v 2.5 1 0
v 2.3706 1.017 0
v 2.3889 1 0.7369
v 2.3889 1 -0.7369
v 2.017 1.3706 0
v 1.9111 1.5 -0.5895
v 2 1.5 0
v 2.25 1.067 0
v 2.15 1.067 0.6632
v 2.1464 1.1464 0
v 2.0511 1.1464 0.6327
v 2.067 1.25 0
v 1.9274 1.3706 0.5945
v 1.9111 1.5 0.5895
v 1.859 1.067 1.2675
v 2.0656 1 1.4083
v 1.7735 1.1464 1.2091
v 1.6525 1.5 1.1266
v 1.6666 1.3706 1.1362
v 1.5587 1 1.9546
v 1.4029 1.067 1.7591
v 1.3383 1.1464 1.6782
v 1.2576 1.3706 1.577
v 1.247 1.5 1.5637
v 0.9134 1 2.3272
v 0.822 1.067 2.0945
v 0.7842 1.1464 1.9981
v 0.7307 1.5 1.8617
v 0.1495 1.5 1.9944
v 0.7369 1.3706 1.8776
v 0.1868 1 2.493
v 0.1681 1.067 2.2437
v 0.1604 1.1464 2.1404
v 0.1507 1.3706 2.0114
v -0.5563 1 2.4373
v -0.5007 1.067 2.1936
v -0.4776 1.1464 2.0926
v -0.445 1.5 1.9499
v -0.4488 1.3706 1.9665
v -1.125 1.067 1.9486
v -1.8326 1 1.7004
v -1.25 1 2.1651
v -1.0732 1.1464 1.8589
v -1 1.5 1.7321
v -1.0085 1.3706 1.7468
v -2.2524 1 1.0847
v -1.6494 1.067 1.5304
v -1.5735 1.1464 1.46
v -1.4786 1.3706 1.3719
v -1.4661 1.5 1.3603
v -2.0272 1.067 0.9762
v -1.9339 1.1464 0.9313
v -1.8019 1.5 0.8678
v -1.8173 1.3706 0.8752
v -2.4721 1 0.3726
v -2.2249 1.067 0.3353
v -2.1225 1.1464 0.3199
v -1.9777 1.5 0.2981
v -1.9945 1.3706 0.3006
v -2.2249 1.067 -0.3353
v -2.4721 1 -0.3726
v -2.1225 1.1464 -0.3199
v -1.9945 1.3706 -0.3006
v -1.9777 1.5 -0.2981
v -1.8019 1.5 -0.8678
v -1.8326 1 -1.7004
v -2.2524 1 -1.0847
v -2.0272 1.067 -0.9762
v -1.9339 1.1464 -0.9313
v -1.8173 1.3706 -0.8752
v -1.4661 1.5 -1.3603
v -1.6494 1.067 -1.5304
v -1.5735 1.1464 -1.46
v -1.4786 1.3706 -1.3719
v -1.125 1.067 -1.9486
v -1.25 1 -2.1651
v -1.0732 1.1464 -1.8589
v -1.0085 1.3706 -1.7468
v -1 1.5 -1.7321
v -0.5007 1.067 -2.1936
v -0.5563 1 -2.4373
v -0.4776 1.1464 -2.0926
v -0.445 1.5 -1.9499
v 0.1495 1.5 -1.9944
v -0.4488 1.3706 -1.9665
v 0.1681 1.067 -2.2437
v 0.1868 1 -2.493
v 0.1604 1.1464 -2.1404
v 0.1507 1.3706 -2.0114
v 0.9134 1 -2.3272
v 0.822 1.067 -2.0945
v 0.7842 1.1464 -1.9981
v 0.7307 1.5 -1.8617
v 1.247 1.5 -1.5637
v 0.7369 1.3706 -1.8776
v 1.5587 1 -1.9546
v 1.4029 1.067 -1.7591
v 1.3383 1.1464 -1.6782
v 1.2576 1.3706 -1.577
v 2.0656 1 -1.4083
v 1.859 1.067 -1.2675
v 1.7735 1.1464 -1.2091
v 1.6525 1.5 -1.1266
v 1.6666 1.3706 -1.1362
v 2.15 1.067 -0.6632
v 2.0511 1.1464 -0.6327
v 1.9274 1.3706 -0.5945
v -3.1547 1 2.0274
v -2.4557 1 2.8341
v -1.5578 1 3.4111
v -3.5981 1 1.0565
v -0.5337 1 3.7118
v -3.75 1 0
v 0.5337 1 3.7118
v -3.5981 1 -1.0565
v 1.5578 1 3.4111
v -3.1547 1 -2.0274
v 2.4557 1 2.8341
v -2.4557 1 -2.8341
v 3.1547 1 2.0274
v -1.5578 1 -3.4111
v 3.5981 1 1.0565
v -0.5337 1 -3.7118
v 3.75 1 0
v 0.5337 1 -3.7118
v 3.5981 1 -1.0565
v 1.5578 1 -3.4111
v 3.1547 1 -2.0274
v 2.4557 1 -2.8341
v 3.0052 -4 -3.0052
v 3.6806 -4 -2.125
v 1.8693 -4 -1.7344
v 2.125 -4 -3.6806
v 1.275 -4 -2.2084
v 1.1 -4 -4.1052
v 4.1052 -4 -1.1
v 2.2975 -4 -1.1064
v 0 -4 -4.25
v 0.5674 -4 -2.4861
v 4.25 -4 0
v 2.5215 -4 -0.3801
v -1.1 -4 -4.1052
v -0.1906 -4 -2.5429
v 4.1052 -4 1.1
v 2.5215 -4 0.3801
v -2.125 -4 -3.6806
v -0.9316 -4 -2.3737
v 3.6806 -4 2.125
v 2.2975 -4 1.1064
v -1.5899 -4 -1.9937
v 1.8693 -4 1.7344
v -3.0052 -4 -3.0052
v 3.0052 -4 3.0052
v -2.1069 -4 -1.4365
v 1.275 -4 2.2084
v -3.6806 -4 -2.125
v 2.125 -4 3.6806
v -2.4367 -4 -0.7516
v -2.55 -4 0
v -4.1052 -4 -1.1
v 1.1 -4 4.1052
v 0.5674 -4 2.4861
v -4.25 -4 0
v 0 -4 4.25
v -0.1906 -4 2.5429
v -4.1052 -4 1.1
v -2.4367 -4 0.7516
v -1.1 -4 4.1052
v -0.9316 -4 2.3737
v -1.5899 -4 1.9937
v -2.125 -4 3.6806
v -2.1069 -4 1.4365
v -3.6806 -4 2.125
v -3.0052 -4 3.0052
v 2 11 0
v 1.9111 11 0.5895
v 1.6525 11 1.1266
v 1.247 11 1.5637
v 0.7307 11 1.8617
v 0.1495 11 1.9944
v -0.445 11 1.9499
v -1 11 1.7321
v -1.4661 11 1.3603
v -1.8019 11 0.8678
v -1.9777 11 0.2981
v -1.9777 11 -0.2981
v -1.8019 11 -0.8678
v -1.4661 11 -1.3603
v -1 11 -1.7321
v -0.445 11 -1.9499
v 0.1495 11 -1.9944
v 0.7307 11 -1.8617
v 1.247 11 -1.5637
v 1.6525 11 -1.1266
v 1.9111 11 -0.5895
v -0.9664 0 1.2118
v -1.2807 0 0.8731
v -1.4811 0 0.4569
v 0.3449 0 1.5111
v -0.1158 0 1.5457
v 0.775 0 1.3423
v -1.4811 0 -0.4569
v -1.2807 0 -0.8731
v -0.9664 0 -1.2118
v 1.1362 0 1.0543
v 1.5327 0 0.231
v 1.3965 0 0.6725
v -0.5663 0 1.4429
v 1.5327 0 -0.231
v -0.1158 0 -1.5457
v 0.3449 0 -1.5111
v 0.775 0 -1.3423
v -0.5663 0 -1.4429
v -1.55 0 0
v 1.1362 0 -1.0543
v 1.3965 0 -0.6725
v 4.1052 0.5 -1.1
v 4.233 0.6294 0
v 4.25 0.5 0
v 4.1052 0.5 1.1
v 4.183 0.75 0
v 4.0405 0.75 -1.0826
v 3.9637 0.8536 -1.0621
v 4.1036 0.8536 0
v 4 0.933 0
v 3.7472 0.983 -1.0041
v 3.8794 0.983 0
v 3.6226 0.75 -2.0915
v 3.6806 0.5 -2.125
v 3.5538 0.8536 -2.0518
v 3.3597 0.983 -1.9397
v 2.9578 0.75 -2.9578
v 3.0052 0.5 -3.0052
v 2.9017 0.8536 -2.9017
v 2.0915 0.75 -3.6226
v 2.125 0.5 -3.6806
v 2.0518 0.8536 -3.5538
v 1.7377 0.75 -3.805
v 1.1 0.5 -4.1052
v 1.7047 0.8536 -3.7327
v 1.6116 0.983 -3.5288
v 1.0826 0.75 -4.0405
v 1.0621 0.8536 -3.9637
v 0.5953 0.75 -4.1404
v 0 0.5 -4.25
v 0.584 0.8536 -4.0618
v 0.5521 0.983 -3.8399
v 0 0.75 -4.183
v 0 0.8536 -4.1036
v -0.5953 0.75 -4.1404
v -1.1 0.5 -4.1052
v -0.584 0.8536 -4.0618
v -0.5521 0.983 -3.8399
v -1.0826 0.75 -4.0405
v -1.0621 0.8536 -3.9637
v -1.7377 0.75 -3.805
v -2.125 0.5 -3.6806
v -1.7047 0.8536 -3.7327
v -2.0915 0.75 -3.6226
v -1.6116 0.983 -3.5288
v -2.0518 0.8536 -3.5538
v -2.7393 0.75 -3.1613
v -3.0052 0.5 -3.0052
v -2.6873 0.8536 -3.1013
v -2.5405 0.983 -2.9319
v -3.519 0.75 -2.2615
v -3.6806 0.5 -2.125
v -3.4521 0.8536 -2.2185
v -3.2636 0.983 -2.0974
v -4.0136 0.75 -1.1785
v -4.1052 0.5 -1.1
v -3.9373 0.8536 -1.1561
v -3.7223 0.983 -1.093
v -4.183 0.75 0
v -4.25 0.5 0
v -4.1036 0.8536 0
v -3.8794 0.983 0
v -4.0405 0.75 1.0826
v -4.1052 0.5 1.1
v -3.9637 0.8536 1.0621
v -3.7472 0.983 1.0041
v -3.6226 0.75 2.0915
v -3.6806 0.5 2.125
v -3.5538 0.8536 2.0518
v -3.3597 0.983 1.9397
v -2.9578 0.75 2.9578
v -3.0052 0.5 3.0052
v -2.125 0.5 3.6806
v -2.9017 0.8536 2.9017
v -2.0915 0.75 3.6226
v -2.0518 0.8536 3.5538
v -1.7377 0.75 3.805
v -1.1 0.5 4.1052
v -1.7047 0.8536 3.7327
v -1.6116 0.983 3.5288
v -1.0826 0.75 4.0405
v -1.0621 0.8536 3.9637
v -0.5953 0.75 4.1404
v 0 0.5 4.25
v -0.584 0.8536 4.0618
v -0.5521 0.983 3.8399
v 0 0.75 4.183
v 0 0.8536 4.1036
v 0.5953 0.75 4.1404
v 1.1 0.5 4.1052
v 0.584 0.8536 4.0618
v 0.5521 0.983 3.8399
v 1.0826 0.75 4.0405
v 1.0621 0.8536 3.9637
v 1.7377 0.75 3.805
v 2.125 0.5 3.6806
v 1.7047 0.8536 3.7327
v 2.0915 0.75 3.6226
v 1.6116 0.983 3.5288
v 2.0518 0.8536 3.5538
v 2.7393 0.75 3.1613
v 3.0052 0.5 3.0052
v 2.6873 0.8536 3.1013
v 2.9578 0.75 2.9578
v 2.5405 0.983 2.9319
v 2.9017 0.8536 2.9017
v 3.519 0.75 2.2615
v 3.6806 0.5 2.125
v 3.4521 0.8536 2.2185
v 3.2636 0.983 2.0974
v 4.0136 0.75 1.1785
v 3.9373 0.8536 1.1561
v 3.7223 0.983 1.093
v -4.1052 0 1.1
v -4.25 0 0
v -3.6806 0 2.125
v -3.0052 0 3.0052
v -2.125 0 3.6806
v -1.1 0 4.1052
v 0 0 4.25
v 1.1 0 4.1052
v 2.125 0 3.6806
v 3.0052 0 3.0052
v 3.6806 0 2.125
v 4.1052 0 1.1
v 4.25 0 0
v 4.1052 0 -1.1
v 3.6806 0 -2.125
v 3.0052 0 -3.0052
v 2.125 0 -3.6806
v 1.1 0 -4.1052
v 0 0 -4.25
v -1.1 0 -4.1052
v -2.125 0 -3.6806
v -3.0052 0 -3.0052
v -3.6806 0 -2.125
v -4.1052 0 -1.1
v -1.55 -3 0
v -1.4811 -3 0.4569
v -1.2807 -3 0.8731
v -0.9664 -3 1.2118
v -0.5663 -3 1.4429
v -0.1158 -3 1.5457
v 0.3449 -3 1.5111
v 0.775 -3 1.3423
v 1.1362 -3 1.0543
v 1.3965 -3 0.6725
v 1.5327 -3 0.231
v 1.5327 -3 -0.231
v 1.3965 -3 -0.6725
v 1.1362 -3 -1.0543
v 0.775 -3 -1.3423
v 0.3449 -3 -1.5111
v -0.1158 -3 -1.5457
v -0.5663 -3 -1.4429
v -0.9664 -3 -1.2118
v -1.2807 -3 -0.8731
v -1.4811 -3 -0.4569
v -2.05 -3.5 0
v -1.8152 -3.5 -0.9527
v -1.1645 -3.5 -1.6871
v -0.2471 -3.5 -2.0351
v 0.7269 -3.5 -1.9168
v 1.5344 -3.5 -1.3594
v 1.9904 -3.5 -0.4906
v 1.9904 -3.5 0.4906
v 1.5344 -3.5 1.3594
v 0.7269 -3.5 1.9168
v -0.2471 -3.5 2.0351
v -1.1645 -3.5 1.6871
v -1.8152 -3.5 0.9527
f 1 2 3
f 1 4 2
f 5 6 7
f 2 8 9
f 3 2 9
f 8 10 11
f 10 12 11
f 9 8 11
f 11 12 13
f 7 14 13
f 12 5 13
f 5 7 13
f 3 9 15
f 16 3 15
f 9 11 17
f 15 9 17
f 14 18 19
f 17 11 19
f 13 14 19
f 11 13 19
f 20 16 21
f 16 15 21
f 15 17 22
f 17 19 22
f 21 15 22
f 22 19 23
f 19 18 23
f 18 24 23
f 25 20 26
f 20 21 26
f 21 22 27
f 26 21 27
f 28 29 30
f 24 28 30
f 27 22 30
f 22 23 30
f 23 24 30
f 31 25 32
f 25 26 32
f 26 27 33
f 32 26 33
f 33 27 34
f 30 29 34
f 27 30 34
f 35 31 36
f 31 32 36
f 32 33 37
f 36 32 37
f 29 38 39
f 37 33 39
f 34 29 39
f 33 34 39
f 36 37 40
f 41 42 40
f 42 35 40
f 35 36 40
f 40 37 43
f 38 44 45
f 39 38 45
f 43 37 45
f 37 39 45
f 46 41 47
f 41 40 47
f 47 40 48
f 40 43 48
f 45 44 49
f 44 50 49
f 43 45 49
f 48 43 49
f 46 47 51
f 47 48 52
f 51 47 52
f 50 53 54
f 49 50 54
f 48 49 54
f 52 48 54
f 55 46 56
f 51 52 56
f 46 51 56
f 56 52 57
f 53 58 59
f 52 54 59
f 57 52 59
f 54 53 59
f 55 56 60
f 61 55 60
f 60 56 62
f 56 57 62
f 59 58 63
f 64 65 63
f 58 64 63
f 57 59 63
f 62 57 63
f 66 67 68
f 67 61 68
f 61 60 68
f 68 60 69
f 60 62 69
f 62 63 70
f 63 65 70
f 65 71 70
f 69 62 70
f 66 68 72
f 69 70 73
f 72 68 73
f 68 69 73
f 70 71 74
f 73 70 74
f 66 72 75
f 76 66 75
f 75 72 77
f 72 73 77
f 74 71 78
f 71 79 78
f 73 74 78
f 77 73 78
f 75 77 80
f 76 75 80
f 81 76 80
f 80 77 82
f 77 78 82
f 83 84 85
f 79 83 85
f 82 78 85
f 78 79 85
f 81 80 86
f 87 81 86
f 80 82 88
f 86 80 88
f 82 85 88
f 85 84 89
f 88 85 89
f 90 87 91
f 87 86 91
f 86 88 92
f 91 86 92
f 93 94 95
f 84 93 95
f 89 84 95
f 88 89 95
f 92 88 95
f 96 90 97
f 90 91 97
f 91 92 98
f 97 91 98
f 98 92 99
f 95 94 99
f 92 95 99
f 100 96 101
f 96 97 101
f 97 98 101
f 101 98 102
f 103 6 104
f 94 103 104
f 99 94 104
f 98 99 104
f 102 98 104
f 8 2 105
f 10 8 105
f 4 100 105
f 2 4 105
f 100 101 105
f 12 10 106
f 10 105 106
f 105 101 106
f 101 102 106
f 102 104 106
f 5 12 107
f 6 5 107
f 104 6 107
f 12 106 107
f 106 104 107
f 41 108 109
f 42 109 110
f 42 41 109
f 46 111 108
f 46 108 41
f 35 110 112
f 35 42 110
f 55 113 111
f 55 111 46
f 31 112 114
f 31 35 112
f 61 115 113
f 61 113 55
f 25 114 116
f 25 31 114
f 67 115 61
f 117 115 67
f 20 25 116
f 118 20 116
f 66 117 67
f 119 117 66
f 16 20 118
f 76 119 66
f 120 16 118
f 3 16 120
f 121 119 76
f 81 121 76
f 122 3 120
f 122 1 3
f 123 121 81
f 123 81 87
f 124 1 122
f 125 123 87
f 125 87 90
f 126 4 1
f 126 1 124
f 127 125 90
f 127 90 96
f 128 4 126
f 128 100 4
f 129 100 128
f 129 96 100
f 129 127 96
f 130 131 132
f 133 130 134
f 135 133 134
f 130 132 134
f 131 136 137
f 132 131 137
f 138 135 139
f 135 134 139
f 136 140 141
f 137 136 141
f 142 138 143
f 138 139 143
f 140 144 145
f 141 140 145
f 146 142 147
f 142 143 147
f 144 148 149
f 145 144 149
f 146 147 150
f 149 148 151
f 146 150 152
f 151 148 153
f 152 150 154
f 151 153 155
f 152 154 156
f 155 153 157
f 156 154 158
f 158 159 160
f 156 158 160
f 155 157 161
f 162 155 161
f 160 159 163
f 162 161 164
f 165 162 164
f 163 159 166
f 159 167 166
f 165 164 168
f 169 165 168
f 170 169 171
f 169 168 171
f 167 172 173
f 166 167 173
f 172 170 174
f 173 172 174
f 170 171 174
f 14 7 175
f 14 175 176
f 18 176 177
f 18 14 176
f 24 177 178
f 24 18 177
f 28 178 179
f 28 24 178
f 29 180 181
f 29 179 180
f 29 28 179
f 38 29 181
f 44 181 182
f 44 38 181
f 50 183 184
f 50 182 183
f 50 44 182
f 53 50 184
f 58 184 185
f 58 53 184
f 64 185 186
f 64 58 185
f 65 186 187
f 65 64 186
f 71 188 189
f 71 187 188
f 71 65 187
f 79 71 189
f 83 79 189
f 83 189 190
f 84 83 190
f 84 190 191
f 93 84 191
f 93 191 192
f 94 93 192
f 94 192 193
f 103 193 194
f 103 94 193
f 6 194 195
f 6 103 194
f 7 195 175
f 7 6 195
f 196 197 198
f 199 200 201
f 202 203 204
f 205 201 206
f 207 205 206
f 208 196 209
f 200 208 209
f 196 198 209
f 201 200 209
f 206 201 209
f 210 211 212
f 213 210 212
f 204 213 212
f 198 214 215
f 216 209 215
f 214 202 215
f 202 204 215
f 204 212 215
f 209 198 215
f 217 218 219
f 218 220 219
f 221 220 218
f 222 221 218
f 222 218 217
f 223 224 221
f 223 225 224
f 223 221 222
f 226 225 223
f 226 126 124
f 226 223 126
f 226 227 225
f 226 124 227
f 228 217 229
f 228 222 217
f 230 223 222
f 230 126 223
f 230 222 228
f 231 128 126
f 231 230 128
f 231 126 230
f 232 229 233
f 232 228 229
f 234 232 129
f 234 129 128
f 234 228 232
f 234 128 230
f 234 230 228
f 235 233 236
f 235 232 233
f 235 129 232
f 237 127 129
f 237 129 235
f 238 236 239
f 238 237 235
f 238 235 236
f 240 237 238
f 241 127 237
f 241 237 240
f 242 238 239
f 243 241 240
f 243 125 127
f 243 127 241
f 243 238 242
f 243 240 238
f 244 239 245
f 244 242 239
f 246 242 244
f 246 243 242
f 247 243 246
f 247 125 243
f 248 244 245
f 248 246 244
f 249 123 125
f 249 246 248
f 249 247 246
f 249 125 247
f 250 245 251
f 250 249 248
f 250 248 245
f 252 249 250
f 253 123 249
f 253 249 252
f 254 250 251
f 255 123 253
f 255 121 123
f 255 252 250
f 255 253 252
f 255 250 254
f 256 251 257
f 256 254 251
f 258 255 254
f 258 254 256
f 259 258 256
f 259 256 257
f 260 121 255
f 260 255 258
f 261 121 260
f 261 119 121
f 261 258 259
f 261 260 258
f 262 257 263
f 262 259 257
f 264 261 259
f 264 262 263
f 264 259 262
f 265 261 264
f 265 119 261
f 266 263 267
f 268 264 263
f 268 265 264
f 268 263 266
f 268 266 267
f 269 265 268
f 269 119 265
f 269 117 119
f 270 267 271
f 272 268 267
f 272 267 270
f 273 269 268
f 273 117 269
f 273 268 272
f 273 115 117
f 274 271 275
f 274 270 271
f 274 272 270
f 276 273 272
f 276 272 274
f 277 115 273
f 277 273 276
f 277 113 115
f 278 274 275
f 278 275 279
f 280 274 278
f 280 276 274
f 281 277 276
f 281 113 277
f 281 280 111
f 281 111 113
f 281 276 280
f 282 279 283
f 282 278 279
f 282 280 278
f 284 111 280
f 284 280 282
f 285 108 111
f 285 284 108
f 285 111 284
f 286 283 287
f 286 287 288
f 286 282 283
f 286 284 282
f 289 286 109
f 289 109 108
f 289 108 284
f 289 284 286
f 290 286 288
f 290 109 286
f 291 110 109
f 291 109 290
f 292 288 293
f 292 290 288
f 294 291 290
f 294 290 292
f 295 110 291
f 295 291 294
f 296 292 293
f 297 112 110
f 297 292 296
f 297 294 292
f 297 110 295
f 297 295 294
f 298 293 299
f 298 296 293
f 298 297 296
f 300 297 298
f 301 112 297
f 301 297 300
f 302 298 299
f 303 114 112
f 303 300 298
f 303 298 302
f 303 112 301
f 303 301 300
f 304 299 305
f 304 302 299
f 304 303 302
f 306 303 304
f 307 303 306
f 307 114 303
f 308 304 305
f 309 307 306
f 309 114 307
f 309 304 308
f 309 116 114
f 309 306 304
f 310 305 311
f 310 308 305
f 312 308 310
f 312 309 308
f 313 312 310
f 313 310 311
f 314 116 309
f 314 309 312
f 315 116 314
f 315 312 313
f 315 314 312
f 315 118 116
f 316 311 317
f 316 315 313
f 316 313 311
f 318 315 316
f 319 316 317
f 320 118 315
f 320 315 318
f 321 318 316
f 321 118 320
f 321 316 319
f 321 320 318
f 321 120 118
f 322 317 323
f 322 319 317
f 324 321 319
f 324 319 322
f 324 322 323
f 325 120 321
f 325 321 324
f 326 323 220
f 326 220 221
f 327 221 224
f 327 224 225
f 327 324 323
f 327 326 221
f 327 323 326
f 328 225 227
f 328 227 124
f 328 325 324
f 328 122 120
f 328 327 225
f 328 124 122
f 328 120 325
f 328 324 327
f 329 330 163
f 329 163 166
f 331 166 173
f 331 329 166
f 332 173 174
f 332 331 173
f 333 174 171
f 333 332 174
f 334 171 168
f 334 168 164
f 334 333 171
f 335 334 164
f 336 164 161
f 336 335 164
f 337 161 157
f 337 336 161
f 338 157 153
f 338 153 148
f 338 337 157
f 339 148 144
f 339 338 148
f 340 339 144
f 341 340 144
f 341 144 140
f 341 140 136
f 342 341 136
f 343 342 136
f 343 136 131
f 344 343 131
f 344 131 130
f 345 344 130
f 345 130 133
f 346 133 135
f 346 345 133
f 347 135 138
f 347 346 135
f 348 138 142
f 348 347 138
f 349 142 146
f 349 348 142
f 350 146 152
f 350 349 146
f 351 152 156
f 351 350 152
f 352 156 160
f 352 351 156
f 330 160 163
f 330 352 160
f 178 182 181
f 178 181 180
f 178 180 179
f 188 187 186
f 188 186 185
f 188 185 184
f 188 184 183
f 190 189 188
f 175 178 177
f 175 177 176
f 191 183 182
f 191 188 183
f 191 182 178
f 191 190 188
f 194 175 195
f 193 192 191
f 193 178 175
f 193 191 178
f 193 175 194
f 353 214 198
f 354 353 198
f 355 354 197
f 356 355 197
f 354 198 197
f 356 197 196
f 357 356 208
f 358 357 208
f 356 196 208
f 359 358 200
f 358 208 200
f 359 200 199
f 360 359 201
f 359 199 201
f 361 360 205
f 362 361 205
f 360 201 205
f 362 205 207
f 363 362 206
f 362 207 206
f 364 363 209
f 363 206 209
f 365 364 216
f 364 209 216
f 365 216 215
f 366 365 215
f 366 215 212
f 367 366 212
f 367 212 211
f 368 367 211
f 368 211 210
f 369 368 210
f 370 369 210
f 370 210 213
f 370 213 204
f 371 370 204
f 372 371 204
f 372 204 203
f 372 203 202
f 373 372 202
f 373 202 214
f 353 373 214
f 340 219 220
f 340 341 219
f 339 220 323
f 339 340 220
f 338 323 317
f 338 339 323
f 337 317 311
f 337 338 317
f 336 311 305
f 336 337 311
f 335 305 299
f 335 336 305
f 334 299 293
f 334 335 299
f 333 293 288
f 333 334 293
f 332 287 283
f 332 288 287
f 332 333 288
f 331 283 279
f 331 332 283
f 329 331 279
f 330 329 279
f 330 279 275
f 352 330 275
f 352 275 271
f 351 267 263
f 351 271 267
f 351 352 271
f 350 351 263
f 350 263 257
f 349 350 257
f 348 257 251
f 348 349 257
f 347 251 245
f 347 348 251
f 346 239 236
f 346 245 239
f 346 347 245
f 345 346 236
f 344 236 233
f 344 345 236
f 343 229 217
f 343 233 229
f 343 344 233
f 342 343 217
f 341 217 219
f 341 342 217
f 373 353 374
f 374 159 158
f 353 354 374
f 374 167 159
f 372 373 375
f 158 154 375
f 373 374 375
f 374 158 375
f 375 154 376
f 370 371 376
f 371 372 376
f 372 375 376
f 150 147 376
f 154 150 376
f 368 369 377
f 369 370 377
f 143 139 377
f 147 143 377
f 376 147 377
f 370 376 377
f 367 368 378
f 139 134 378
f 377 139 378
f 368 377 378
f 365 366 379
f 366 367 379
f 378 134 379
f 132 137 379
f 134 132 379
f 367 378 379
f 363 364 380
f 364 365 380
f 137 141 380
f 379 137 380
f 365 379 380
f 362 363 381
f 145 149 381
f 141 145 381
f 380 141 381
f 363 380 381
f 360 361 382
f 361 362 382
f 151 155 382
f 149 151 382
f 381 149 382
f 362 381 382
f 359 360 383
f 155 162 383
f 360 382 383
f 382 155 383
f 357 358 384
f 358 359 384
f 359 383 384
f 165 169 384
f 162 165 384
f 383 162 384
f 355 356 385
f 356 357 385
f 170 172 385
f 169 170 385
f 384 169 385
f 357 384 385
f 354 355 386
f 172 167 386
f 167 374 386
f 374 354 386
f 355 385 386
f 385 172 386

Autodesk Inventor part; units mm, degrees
ref_plane "YZ Plane" through (0, 0, 0) normal (1, 0, 0) x (0, 1, 0)
ref_plane "XZ Plane" through (0, 0, 0) normal (0, 1, 0) x (-1, 0, 0)
ref_plane "XY Plane" through (0, 0, 0) normal (0, 0, 1) x (1, 0, 0)
sketch "Sketch1" plane through (0, 0, 0) normal (0, 1, 0) x (-1, 0, 0)
  circle A0 centre (0, 0) radius 1.55
  circle A1 centre (0, 0) radius 4.25
  dimension "d0" = 3.1
  dimension "d1" = 8.5
extrude "Extrusion1" add sketch "Sketch1" against normal blind 4
sketch "Sketch2" plane through (0, 0, 0) normal (0, 1, 0) x (1, 0, 0)
  circle A0 centre (0, 0) radius 4.25 projected
extrude "Extrusion2" add sketch "Sketch2" along normal blind 1
sketch "Sketch3" plane through (0, 1, 0) normal (0, 1, 0) x (1, 0, 0)
  circle A0 centre (0, 0) radius 2
  dimension "d6" = 4
extrude "Extrusion3" add sketch "Sketch3" along normal blind 10
fillet "Fillet1" radius 0.5 2 edges at (-2, 1, 0) (-4.25, 1, 0)
chamfer "Chamfer1" distance 1 angle 45 1 edges at (1.55, -4, 0)
properties part number "przycisk"
